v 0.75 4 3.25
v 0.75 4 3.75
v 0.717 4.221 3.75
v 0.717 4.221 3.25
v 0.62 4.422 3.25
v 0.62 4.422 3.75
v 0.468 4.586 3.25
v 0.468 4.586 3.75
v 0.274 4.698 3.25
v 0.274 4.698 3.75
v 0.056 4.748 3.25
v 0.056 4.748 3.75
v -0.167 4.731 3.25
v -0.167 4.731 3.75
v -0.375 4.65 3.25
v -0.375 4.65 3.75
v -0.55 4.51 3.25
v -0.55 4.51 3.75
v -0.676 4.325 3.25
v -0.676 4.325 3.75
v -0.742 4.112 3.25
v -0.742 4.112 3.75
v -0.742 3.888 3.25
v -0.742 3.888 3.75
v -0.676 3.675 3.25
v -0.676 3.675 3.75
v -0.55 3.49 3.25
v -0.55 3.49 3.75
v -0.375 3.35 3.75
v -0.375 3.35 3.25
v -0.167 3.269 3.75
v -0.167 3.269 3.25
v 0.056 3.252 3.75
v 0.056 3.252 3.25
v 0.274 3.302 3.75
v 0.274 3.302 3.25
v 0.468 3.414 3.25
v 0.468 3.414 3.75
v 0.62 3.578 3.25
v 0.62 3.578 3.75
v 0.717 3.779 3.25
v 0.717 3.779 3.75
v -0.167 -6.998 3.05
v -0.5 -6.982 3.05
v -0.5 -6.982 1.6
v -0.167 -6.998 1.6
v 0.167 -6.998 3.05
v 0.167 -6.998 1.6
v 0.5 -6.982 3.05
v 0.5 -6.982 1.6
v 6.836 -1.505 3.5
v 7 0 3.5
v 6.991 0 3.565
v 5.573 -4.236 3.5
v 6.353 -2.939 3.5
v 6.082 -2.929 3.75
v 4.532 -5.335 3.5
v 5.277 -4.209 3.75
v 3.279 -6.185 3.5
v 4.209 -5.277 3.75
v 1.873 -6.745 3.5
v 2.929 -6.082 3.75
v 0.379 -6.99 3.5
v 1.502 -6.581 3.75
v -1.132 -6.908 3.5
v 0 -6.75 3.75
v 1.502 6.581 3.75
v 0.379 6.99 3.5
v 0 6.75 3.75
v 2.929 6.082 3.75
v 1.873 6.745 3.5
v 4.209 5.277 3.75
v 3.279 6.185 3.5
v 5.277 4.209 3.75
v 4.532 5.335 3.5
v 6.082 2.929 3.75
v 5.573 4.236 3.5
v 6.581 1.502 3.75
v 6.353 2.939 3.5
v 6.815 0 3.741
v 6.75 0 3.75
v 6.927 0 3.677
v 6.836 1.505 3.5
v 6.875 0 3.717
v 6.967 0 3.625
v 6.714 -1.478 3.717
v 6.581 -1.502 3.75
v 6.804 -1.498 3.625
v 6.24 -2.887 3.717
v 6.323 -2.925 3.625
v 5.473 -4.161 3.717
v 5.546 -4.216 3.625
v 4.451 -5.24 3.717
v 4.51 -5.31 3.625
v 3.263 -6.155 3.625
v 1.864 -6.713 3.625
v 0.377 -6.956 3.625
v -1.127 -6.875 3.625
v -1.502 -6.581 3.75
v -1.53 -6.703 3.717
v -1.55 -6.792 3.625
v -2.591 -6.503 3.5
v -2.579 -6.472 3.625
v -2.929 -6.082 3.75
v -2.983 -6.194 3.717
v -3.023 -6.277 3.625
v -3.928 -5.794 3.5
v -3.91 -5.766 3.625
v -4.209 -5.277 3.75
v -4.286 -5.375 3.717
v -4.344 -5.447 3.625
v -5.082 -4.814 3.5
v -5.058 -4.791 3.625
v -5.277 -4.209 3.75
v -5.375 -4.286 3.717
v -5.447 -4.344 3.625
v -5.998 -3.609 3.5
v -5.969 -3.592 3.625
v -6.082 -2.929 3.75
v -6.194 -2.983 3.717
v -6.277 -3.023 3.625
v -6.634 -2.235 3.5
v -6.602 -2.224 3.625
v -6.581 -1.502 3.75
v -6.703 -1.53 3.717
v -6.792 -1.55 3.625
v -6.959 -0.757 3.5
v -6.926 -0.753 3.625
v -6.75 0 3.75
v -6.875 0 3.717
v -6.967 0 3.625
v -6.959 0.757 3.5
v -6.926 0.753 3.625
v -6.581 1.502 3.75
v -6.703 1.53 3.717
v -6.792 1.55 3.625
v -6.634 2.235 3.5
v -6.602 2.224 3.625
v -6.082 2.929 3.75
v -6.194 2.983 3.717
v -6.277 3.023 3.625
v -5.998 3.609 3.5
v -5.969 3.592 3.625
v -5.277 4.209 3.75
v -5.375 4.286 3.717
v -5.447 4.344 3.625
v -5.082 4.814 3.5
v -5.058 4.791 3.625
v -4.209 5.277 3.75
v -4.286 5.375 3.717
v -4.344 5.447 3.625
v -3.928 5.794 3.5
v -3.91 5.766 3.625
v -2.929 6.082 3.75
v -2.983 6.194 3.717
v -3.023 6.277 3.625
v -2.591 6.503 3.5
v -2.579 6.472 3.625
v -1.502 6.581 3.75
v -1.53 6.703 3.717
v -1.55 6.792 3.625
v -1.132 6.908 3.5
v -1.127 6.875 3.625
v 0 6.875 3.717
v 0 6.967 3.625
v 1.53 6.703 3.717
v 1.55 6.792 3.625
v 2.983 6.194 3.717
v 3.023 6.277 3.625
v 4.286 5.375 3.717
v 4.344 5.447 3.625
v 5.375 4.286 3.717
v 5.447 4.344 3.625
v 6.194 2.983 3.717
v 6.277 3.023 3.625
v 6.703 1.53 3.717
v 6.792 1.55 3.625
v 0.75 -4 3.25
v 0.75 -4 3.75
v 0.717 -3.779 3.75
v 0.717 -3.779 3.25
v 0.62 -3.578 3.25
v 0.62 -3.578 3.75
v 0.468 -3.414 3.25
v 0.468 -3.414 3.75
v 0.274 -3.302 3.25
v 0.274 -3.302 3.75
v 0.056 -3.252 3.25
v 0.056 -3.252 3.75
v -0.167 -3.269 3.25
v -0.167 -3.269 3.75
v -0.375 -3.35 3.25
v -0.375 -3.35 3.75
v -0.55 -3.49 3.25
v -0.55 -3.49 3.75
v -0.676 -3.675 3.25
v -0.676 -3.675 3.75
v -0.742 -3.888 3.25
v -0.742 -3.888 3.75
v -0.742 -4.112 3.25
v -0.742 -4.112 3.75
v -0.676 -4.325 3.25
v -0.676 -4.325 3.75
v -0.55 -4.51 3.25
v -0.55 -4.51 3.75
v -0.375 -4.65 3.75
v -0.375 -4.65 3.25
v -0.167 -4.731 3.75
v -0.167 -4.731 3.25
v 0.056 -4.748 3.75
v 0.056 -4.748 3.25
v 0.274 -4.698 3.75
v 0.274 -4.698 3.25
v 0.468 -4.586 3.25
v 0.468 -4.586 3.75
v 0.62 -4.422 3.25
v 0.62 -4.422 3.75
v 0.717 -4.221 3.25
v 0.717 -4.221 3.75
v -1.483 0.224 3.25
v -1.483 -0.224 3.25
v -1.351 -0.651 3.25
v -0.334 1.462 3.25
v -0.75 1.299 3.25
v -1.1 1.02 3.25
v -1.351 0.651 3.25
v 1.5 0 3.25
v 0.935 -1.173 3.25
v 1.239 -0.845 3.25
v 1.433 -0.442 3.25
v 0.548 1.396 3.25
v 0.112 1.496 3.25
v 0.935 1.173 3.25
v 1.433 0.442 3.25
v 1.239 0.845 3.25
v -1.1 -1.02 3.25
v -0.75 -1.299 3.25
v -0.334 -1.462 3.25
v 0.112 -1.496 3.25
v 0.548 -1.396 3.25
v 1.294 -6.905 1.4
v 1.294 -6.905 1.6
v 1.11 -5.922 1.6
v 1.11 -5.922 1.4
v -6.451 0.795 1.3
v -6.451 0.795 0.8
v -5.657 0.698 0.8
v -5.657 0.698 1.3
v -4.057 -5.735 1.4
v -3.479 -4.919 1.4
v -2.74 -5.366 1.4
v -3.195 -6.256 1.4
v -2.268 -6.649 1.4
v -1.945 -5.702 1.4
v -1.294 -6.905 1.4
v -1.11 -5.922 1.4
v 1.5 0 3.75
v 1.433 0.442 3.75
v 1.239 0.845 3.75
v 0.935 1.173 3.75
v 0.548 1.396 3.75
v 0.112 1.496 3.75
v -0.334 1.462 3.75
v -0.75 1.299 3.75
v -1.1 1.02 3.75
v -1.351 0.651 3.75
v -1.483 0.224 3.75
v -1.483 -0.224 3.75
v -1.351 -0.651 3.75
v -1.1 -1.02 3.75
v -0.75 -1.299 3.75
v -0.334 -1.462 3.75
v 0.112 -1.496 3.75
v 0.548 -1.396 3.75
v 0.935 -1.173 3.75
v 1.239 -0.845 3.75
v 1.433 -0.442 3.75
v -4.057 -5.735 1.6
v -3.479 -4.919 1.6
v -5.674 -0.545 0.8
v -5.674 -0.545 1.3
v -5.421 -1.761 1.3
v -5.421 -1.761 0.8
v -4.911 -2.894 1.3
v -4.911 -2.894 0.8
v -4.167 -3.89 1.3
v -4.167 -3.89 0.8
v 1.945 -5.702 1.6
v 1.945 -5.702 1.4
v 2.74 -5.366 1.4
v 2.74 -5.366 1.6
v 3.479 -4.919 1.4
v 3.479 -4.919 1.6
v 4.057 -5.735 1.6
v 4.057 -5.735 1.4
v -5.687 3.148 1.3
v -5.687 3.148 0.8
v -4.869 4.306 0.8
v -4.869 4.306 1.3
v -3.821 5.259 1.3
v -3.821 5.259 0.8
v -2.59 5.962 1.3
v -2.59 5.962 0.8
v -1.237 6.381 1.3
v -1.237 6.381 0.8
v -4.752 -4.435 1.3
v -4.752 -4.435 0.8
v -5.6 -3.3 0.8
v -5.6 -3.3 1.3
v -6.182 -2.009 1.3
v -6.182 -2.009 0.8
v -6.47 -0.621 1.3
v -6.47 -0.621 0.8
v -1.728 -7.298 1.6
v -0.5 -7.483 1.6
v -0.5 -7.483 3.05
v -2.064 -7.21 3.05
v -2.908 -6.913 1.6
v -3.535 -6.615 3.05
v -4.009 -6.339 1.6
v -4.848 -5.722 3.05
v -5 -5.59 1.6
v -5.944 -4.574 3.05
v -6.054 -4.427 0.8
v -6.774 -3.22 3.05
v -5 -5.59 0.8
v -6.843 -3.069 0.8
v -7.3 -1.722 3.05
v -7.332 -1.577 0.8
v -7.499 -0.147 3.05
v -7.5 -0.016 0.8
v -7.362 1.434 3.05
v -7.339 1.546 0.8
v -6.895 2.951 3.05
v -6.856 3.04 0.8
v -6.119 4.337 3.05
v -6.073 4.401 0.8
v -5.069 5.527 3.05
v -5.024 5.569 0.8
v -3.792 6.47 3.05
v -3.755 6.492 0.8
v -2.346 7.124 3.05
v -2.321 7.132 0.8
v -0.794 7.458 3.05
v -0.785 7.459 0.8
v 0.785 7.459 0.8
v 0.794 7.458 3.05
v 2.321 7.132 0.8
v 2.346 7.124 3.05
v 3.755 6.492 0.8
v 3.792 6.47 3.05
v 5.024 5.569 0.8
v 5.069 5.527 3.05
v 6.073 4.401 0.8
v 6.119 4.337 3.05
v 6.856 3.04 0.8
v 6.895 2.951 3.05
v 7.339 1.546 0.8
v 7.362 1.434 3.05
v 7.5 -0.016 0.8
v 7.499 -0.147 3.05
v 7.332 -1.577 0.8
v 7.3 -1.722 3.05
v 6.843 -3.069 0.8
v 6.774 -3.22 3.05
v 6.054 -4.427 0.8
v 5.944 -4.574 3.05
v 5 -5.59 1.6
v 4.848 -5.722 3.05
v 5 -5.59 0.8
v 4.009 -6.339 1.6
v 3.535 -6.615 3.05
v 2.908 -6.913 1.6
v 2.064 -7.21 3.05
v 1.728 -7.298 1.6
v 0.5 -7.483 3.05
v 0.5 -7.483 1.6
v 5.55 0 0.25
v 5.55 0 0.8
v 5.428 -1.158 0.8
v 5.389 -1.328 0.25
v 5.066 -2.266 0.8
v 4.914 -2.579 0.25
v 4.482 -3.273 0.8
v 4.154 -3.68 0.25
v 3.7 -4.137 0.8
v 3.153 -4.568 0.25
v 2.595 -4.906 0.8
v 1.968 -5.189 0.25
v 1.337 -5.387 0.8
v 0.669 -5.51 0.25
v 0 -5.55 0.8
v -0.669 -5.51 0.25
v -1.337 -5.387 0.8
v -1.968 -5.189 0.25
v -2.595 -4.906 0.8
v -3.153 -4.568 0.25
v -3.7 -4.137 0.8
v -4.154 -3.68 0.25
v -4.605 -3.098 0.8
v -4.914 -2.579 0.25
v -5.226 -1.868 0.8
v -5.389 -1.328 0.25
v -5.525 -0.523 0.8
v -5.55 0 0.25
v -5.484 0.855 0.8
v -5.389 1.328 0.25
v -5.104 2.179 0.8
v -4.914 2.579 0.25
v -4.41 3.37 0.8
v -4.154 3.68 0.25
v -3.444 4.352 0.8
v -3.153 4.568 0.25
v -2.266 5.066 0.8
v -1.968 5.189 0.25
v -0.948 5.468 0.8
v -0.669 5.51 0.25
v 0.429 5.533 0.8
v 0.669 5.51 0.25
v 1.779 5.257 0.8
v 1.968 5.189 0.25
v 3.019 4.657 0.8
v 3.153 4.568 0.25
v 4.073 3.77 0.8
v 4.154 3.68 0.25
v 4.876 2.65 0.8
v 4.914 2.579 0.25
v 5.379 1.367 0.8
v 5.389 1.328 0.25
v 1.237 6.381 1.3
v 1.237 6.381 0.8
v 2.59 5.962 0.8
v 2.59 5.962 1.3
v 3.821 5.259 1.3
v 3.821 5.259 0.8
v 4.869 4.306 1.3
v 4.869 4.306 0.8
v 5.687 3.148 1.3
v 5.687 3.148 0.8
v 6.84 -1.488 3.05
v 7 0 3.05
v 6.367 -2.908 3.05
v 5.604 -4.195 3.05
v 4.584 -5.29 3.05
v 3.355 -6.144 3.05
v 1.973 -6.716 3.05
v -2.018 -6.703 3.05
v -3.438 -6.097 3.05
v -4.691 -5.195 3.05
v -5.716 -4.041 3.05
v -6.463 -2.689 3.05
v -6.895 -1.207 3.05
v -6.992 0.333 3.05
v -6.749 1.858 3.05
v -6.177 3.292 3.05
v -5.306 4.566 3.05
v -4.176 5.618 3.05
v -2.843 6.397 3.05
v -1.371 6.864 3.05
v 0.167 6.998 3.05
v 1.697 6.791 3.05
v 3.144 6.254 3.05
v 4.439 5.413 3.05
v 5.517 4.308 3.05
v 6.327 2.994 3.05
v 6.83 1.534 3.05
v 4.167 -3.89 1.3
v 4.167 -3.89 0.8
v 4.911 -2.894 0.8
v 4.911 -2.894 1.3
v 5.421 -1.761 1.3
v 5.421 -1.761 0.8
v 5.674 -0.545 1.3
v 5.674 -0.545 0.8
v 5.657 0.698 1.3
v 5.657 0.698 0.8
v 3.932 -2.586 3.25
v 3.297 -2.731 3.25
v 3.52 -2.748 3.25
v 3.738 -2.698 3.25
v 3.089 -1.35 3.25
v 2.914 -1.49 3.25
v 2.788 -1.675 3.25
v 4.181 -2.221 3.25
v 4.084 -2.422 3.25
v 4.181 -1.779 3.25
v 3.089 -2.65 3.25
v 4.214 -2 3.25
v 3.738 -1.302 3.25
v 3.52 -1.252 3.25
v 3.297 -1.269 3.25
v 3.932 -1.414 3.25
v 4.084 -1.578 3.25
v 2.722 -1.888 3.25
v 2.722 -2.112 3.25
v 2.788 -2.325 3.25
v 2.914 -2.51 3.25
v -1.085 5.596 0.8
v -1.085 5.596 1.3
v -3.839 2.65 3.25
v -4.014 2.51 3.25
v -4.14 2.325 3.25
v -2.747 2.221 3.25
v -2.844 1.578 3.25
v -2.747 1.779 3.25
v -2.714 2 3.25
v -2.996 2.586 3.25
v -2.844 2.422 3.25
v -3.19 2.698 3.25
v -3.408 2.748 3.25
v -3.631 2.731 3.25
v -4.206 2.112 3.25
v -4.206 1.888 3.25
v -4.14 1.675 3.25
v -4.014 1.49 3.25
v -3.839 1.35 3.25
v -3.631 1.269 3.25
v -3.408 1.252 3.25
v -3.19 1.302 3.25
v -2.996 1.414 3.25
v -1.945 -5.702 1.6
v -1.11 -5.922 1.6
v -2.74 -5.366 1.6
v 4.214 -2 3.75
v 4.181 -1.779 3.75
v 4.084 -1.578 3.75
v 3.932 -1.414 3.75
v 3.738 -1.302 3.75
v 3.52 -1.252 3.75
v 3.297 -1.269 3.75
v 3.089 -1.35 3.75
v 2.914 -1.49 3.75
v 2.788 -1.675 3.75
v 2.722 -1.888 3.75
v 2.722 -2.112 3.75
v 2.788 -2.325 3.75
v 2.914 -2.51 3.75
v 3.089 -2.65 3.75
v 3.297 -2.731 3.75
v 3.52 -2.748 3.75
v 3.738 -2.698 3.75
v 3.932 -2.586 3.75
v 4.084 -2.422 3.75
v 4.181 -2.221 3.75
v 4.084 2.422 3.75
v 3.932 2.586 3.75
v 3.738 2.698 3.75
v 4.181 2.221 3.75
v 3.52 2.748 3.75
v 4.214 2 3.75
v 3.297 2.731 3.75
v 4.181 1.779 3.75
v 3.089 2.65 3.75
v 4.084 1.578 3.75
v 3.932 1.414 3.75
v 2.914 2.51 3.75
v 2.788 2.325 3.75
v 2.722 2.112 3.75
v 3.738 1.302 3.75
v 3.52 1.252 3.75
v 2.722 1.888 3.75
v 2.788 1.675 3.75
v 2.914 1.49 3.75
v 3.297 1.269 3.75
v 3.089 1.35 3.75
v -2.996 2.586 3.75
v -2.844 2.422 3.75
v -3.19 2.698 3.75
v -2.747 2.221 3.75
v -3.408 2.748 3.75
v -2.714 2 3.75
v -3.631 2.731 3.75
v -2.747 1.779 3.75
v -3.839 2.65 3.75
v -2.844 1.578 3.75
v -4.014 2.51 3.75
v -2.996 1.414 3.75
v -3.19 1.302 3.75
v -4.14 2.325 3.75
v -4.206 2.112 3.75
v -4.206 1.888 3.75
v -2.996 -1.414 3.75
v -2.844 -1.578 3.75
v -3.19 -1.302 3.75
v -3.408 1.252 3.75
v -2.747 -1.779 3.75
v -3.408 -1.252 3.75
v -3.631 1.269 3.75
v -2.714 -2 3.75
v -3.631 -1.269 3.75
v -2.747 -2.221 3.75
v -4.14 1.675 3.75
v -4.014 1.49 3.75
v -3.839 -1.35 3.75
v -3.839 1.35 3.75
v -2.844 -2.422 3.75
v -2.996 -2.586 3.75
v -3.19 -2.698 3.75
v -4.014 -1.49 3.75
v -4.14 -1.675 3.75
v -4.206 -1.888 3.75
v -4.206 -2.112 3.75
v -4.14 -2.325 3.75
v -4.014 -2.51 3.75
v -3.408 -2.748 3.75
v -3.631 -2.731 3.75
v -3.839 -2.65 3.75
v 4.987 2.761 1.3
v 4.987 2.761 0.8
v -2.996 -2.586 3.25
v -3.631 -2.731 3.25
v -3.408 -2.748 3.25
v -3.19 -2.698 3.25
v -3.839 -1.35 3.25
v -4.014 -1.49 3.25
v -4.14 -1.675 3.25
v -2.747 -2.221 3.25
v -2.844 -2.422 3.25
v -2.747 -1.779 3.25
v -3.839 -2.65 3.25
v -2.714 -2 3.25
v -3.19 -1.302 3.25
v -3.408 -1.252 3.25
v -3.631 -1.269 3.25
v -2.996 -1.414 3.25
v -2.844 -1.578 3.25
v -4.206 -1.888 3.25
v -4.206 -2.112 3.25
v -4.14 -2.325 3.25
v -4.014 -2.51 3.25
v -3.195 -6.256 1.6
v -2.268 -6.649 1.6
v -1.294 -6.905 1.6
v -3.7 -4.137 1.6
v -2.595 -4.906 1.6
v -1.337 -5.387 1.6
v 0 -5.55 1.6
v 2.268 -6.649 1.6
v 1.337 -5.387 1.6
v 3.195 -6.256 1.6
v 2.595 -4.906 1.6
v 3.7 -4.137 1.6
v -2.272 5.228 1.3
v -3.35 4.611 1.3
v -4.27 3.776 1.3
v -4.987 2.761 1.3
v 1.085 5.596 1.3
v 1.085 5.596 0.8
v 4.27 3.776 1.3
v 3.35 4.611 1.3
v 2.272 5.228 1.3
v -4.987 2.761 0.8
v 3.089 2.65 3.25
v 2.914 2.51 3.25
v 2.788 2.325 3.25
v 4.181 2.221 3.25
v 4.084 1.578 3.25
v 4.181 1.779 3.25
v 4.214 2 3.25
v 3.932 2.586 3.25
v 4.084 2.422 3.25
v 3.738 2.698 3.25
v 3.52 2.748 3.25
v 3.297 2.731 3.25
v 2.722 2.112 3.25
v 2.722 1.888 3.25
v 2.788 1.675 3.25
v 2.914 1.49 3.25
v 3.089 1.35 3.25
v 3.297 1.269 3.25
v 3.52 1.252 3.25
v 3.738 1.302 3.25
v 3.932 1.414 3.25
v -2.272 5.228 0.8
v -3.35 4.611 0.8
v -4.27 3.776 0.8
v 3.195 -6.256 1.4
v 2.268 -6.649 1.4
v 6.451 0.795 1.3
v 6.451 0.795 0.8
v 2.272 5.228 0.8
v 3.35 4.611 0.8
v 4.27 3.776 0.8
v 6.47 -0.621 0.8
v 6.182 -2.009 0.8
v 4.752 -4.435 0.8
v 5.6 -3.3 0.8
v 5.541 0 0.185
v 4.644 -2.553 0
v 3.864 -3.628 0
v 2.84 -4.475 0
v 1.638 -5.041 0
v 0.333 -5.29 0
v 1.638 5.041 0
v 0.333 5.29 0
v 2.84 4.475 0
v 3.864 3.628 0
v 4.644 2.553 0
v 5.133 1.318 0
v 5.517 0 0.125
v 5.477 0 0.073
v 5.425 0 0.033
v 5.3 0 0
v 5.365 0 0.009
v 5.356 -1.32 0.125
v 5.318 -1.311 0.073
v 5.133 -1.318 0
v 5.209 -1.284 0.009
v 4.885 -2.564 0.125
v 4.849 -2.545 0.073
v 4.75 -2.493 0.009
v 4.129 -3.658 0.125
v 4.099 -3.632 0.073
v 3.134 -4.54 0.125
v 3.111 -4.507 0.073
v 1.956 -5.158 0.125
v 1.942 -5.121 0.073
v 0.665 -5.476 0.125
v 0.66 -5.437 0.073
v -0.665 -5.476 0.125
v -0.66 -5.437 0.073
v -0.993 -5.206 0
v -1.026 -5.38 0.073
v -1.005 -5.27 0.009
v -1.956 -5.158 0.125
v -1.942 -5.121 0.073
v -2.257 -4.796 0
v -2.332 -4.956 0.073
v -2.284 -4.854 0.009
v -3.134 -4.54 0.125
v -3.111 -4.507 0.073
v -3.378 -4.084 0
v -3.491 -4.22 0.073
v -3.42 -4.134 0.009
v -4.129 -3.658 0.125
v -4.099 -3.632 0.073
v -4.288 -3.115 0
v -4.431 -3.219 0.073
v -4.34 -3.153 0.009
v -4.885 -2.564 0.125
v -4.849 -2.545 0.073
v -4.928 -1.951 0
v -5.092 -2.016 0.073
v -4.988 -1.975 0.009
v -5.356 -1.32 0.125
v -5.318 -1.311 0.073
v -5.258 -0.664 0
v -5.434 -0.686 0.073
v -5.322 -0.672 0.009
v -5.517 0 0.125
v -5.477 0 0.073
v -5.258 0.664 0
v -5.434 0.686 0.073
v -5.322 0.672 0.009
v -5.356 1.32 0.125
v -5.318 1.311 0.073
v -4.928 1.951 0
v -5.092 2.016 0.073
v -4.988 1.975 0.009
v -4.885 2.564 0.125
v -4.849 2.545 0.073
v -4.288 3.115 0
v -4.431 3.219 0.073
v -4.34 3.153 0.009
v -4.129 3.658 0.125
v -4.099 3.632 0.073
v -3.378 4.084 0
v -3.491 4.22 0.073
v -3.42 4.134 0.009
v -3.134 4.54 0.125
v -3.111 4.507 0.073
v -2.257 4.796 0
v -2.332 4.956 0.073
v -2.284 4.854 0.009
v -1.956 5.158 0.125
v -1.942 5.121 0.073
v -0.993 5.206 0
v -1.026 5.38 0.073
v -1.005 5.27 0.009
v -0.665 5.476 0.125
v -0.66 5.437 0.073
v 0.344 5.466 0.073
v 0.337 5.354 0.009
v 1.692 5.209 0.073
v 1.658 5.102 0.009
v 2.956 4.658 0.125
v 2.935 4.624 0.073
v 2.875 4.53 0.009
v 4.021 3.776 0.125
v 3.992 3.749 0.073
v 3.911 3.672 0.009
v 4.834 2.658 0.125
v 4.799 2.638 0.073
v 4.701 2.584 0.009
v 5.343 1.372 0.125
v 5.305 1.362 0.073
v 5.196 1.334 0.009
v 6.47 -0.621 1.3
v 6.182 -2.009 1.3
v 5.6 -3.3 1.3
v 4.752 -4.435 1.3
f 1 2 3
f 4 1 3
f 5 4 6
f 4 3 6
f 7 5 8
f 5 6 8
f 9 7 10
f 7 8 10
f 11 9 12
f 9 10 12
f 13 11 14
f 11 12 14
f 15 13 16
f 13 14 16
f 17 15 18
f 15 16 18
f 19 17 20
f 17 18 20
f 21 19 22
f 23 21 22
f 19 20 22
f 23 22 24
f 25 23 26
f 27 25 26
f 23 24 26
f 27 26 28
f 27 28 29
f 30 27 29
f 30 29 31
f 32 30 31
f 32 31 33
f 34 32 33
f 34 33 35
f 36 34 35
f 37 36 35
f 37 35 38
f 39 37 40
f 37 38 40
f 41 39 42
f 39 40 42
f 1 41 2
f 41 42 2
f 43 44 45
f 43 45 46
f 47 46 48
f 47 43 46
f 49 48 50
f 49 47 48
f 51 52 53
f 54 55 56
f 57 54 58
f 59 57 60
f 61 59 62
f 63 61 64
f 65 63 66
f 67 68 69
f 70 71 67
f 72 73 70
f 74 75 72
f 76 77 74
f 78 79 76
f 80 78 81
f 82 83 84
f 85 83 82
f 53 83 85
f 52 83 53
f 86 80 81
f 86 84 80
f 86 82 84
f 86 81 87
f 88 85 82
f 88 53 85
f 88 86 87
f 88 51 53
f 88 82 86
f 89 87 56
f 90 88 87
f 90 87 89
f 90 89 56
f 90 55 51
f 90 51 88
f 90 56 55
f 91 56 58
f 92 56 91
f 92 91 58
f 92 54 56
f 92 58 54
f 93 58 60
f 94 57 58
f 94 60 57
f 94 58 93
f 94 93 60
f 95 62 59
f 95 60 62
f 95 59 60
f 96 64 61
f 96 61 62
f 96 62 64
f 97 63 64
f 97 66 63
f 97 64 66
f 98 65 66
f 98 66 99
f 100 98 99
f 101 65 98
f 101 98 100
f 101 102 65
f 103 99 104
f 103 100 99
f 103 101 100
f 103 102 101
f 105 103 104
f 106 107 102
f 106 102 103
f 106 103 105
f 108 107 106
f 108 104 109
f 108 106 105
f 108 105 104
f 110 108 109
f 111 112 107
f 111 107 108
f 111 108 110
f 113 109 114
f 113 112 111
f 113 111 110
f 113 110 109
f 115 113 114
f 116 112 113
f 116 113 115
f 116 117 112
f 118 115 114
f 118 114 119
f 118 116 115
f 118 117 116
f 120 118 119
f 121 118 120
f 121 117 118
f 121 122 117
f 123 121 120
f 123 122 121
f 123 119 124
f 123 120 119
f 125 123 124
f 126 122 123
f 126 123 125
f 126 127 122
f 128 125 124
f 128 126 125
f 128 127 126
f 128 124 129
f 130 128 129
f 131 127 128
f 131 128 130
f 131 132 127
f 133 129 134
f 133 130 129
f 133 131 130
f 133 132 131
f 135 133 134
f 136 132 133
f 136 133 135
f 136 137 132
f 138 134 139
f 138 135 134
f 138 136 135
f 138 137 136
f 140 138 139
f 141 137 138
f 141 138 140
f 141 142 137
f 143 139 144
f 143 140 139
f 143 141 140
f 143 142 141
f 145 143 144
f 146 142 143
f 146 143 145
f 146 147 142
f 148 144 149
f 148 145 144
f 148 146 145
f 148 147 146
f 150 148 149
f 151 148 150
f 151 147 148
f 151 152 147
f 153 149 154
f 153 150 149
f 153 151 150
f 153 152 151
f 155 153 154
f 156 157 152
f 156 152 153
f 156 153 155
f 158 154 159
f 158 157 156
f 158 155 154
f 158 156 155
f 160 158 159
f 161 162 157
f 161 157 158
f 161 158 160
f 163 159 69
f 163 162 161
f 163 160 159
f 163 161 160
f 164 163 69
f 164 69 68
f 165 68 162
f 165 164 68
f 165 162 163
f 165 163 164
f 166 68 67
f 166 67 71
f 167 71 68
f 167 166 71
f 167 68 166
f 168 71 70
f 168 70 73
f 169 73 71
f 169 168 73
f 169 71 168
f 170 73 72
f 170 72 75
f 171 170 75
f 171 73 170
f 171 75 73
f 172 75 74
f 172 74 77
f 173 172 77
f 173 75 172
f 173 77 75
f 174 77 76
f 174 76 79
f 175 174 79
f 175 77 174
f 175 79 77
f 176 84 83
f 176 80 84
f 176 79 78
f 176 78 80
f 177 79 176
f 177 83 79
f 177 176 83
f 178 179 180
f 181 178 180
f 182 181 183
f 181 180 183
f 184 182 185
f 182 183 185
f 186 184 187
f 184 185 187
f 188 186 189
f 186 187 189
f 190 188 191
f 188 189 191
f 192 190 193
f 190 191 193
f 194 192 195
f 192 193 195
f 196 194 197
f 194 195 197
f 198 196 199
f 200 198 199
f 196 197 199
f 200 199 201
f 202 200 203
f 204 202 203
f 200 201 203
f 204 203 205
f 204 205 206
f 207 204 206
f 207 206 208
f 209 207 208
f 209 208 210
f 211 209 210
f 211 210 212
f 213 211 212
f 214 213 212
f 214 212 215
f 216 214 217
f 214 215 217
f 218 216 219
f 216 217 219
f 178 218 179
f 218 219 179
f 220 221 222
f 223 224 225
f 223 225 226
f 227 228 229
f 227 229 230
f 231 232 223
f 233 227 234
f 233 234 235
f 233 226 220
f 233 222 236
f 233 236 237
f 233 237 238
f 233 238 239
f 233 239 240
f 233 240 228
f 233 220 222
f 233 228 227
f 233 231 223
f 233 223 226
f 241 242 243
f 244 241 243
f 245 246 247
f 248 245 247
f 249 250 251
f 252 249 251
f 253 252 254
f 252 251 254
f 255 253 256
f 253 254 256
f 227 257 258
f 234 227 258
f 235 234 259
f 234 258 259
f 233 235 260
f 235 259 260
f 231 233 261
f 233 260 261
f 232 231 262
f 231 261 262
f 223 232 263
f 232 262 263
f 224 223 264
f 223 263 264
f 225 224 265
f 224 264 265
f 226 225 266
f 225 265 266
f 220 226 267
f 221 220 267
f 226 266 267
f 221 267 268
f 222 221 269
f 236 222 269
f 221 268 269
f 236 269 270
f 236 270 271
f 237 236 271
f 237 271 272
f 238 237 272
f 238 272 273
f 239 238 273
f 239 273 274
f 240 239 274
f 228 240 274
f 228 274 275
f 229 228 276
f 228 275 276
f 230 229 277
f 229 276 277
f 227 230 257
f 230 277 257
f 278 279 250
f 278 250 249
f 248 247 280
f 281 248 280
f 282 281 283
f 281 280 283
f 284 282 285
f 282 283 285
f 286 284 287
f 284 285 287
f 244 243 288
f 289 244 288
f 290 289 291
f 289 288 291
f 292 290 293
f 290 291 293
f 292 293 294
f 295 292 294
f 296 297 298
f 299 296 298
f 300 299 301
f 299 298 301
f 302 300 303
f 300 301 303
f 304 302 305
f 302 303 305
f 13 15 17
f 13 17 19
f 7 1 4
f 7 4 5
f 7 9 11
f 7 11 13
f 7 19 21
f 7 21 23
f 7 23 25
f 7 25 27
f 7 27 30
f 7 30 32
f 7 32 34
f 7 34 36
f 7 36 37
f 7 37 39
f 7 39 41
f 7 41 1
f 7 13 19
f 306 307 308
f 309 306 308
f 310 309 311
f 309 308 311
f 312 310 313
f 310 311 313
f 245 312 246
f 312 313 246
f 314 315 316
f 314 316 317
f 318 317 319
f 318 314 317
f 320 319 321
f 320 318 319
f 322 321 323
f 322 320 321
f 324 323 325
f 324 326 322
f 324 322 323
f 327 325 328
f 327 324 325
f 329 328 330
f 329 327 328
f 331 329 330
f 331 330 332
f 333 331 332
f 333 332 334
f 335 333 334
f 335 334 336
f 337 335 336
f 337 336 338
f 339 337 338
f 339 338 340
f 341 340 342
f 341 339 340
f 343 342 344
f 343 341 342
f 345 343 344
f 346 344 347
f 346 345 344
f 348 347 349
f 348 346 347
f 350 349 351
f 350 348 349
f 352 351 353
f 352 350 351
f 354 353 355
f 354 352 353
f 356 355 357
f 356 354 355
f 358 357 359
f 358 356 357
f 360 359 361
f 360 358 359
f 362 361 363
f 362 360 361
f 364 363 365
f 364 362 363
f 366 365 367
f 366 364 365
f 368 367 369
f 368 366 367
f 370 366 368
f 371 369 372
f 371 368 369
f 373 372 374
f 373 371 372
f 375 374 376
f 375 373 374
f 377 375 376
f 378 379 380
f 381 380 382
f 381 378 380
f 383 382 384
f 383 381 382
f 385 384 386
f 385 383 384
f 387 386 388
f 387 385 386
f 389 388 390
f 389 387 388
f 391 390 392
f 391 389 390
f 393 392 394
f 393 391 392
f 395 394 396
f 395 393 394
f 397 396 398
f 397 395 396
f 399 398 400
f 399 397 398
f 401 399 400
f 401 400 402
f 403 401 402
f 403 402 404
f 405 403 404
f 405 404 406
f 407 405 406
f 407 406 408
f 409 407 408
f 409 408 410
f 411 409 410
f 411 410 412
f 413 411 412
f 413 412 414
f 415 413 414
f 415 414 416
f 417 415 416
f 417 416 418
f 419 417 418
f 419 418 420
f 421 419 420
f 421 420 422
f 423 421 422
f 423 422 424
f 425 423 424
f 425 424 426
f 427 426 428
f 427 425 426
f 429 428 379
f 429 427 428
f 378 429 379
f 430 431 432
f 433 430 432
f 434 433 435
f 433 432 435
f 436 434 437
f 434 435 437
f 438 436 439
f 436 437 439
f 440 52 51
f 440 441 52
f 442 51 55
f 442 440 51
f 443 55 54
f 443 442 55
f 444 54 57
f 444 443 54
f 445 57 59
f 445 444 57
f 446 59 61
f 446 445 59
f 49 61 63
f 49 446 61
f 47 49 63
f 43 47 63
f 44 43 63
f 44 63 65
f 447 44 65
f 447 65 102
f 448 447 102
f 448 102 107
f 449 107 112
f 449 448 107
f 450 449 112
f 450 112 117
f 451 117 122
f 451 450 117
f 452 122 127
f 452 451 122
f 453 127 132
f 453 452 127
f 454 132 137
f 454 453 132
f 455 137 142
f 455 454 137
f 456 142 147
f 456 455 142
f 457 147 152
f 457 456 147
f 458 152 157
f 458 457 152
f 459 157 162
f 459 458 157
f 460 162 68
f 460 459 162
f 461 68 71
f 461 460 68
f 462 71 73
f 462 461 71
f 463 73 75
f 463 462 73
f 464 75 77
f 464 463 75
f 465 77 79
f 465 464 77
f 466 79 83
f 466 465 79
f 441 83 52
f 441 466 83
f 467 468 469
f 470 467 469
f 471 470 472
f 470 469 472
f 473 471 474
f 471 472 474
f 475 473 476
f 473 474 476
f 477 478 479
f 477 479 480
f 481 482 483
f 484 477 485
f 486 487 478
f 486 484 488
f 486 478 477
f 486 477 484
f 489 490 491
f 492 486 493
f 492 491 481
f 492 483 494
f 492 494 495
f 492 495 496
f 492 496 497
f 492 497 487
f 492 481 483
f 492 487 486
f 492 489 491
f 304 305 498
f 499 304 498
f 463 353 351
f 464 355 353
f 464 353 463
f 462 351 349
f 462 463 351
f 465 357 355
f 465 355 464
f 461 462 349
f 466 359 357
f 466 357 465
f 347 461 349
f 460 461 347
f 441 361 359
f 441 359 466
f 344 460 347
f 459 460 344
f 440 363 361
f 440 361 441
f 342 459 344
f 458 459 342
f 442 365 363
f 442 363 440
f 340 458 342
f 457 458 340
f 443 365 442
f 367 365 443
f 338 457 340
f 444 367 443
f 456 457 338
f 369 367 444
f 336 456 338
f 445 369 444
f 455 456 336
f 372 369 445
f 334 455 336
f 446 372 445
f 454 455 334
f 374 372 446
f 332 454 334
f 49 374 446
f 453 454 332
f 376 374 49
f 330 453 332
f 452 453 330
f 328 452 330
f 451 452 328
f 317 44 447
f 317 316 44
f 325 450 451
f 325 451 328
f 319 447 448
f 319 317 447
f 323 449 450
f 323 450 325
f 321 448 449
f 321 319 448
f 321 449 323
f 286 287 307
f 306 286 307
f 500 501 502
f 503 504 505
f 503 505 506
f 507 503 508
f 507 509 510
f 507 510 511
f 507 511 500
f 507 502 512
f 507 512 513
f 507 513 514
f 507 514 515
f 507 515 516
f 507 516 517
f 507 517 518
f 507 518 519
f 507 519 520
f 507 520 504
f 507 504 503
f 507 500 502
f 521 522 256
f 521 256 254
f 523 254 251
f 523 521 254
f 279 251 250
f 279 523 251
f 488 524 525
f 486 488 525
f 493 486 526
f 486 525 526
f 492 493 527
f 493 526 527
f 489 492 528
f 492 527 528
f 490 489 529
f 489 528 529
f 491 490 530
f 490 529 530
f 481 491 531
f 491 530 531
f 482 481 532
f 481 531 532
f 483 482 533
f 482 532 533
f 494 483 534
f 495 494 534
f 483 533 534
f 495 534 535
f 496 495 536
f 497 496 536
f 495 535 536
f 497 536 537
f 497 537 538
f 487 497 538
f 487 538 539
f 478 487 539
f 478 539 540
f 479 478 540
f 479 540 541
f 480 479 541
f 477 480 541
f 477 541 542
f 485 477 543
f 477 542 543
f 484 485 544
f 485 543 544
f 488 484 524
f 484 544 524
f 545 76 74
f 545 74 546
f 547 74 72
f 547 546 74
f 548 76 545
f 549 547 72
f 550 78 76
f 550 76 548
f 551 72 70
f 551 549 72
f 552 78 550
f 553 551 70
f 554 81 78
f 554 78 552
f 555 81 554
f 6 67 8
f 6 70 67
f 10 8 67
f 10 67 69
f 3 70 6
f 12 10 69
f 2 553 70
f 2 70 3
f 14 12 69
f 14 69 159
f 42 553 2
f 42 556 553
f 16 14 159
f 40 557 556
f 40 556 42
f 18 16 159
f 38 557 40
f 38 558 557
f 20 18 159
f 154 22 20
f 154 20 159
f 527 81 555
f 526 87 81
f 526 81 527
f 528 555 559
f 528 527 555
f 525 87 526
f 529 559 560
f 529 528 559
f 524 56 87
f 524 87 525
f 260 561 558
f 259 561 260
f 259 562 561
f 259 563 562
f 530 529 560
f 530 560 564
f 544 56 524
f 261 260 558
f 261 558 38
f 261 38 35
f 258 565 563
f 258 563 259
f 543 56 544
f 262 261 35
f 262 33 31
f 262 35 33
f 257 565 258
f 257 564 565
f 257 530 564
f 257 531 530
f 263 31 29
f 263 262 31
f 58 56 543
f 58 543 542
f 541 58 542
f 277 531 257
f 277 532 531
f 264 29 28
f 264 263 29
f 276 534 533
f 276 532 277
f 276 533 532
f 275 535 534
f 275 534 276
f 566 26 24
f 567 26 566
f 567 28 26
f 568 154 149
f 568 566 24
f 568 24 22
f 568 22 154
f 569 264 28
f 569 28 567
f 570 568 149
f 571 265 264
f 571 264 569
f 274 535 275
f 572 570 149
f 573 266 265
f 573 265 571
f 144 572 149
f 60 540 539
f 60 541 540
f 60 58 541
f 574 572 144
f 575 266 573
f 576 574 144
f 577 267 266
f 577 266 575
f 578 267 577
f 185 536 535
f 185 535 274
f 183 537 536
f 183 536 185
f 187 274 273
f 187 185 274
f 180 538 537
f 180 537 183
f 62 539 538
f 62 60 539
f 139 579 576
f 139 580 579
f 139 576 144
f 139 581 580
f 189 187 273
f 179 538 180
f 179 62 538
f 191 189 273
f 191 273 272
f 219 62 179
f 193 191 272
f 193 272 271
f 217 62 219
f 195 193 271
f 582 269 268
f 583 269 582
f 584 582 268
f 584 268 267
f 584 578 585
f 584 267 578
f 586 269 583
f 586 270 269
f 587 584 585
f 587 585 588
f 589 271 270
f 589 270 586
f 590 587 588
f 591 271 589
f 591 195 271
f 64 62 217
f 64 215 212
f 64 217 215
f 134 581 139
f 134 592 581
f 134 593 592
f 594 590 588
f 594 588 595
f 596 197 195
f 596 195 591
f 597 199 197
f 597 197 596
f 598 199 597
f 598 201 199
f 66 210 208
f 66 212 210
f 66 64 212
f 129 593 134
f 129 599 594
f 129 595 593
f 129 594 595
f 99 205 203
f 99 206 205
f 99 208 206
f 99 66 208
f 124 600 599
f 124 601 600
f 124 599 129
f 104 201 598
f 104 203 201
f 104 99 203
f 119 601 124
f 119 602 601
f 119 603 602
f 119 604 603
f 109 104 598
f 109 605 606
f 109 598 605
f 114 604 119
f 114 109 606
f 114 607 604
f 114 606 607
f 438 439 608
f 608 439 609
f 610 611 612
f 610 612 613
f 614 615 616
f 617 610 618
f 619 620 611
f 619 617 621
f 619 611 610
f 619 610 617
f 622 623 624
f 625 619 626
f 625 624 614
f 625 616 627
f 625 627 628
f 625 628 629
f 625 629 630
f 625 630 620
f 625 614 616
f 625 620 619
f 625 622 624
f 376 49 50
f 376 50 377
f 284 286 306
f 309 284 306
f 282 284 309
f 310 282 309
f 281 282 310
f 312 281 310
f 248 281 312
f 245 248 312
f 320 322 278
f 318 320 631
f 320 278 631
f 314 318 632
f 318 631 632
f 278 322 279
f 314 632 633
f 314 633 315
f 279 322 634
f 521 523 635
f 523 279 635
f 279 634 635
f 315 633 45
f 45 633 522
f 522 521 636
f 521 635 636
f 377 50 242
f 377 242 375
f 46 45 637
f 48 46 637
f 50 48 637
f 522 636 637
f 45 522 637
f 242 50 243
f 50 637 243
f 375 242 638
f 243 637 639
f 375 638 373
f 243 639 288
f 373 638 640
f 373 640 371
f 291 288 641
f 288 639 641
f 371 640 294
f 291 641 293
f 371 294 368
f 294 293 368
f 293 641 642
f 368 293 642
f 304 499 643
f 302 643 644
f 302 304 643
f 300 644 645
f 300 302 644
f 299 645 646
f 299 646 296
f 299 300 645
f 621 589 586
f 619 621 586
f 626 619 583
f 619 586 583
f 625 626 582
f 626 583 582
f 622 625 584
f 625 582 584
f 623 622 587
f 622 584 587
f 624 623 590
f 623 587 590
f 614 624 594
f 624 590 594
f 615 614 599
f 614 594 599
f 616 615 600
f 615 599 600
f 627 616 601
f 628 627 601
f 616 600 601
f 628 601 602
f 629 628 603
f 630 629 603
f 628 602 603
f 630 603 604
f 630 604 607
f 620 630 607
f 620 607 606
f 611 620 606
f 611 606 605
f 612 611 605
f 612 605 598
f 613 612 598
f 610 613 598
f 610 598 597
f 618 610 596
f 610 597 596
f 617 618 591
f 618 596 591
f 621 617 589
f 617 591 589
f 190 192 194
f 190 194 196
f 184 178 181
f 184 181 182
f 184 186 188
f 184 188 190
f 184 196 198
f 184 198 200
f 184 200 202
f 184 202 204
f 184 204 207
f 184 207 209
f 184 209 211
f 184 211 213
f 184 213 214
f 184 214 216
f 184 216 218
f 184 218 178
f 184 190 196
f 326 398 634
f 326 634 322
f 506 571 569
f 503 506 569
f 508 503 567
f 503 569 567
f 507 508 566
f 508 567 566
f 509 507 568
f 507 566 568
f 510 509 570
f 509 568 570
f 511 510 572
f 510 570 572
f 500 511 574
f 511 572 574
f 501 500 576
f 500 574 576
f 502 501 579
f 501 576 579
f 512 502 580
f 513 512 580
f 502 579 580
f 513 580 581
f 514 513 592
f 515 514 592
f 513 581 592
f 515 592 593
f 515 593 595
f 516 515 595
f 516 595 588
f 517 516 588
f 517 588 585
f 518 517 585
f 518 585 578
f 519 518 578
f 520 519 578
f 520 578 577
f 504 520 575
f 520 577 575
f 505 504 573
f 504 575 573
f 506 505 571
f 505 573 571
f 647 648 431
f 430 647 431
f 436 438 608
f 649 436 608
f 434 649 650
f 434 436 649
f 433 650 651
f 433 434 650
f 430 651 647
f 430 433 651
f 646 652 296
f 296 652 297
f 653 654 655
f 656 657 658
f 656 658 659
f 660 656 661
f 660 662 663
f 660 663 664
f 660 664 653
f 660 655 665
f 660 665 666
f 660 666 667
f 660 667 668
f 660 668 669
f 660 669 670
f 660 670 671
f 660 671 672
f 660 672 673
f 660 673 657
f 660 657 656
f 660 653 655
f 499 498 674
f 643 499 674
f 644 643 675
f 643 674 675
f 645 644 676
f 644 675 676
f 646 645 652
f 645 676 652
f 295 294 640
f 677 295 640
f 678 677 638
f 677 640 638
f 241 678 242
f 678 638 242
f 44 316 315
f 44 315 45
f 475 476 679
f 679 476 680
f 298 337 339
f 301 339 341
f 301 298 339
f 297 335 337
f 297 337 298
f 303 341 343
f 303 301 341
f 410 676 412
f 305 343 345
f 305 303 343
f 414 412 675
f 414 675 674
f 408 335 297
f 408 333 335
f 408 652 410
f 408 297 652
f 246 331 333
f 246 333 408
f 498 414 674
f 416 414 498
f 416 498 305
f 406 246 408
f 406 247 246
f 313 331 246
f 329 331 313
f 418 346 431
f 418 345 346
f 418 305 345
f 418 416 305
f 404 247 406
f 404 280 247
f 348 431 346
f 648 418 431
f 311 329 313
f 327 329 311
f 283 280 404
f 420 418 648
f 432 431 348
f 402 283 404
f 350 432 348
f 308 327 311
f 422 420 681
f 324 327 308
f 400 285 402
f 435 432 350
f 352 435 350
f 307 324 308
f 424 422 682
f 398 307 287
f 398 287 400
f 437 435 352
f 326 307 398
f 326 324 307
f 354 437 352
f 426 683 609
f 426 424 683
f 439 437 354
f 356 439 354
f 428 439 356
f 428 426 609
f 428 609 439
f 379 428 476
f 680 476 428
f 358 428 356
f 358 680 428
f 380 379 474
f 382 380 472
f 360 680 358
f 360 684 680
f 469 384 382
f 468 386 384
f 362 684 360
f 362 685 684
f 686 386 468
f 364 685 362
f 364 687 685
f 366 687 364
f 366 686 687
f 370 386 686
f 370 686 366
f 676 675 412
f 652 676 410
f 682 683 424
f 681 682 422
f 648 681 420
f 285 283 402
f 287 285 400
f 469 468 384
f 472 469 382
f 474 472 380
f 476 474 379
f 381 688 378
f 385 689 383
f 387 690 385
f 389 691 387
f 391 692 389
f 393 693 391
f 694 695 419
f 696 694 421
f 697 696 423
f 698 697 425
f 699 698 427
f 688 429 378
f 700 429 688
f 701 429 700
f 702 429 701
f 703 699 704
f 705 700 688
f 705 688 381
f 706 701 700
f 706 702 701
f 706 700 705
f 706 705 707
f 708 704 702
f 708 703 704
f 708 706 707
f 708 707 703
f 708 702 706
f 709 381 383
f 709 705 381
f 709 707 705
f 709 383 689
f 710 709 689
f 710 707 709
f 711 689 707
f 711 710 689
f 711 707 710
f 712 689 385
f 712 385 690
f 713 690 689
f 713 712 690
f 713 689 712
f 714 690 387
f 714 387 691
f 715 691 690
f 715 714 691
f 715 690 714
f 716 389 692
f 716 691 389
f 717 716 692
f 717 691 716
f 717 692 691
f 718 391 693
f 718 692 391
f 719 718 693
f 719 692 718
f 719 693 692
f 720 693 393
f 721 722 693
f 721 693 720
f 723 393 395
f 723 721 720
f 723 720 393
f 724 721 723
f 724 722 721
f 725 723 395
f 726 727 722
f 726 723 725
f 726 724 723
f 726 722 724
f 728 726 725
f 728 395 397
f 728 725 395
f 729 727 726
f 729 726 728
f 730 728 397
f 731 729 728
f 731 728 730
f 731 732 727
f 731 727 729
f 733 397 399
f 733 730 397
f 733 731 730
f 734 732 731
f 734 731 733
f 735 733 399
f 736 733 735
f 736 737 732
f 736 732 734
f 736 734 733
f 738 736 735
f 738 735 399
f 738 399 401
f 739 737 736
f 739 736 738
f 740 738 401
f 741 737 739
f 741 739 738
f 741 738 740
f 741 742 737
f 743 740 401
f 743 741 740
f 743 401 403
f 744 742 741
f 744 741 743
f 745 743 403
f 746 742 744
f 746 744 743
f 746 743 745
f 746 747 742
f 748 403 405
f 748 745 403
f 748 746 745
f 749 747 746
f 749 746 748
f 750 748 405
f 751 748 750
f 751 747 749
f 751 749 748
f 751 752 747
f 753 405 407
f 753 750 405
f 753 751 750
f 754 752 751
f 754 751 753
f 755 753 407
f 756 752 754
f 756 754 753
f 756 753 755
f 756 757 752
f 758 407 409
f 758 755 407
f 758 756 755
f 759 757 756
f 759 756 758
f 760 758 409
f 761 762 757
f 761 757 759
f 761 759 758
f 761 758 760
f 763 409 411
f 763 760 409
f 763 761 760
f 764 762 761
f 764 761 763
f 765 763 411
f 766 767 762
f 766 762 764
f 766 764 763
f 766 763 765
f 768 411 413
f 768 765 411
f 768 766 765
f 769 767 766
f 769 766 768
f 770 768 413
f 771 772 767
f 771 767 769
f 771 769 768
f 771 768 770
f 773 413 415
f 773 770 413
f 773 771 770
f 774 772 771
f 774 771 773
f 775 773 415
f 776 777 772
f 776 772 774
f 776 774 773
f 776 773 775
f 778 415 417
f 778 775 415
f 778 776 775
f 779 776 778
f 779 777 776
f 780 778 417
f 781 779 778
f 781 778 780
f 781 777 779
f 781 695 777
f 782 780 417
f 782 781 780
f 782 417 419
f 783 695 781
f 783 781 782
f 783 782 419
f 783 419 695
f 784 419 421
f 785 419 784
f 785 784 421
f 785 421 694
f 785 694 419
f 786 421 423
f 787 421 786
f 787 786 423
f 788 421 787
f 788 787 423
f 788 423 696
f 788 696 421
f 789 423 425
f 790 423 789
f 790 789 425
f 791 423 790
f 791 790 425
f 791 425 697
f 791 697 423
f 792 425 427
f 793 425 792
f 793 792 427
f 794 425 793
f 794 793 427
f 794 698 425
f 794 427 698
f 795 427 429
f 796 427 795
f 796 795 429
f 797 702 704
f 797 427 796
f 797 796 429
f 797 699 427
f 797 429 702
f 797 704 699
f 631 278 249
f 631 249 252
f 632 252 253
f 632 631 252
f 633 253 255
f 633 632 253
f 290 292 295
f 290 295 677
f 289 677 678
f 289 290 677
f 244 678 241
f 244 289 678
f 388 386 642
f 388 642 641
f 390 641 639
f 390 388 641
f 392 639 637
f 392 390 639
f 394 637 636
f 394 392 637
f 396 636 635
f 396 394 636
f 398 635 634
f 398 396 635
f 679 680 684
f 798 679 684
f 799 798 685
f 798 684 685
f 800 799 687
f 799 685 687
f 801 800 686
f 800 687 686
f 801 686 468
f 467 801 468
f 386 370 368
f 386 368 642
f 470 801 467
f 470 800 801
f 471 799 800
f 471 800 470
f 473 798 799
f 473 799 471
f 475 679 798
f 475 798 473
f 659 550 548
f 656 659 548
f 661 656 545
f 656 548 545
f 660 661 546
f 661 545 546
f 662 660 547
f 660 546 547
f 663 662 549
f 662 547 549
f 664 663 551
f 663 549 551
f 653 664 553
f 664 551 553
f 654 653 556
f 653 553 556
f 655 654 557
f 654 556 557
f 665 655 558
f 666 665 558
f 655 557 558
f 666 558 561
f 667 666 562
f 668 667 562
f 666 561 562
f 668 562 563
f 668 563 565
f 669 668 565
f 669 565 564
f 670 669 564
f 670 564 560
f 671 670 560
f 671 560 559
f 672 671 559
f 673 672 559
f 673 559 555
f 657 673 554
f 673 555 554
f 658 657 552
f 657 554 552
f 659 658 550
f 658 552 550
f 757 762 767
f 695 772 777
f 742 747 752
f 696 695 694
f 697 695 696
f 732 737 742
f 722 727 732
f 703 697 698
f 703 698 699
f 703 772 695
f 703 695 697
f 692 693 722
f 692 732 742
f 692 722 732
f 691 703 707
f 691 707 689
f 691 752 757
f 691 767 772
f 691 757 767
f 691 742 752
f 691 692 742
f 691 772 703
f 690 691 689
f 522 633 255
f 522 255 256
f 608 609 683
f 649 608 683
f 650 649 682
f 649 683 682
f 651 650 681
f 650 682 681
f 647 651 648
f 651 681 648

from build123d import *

# Parameters (mm, degrees)
FILLET_1_R          = 0.25
SKETCH_2_R          = 1.5
SKETCH_2_R_2        = 0.75
CUT_EXTRUDE_1_DEPTH = 0.5
CUT_EXTRUDE_2_REACH = 13.036
CUT_EXTRUDE_3_DEPTH = 0.5
CUT_EXTRUDE_4_DEPTH = 0.8
EXTRUDE_1_DEPTH     = 0.2


with BuildPart() as part:
    # Эскиз1 → Повернуть1 (revolve)
    with BuildSketch(Plane(origin=(0, 0, 0), x_dir=(1, 0, 0), z_dir=(0, 1, 0)), mode=Mode.PRIVATE) as revolve_1_sk:
        Polygon((0, 0), (0, -3.75), (-7, -3.75), (-7, -3.05), (-7.5, -3.05), (-7.5, -0.8), (-5.55, -0.8), (-5.55, 0), align=None)
    revolve(revolve_1_sk.sketch.rotate(Axis((0, 0, 0), (0, 0, -1)), 180), axis=Axis((0, 0, 0), (0, 0, -1)))

    # Скругление1
    fillet_1_edges = [part.edges().sort_by_distance(p)[0] for p in [
        (-5.55, 0, 0),
        (-7, 0, 3.75),
    ]]
    fillet(fillet_1_edges, radius=FILLET_1_R)

    # Эскиз2 → Вырез-Вытянуть1 (cut)
    with BuildSketch(Plane.XY.offset(3.75)):
        Circle(SKETCH_2_R)
        with Locations((0, -4)):
            Circle(SKETCH_2_R_2)
        with Locations((-3.464101615, -2)):
            Circle(SKETCH_2_R_2)
        with Locations((-3.464101615, 2)):
            Circle(SKETCH_2_R_2)
        with Locations((0, 4)):
            Circle(SKETCH_2_R_2)
        with Locations((3.464101615, 2)):
            Circle(SKETCH_2_R_2)
        with Locations((3.464101615, -2)):
            Circle(SKETCH_2_R_2)
    extrude(amount=-CUT_EXTRUDE_1_DEPTH, mode=Mode.SUBTRACT)

    # Эскиз3 → Вырез-Вытянуть2 (cut, up to next)
    with BuildSketch(Plane.XY.offset(3.05), mode=Mode.PRIVATE) as cut_extrude_2_sk1:
        with BuildLine():
            Line((0.5, -6.982120022), (0.5, -7.483314774))
            ThreePointArc((0.5, -7.483314774), (0, -7.5), (-0.5, -7.483314774))
            Line((-0.5, -7.483314774), (-0.5, -6.982120022))
            ThreePointArc((-0.5, -6.982120022), (0, -7), (0.5, -6.982120022))
        make_face()
    cut_extrude_2_tool1 = extrude(cut_extrude_2_sk1.sketch, amount=-CUT_EXTRUDE_2_REACH, mode=Mode.PRIVATE) & part.part
    add(cut_extrude_2_tool1.solids().sort_by_distance((0, -7.244238, 3.05))[0], mode=Mode.SUBTRACT)

    # Эскиз4 → Вырез-Вытянуть3 (cut)
    with BuildSketch(Plane(origin=(0, 0, 0.8), x_dir=(-1, 0, 0), z_dir=(0, 0, -1))):
        with BuildLine():
            Line((-4.751554754, -4.435394844), (-4.166748015, -3.889500094))
            ThreePointArc((-4.166748015, -3.889500094), (-5.421022143, -1.761396868), (-5.657160749, 0.697518642))
            Line((-5.657160749, 0.697518642), (-6.451148223, 0.795415996))
            ThreePointArc((-6.451148223, 0.795415996), (-6.181867356, -2.008610463), (-4.751554754, -4.435394844))
        make_face()
        with BuildLine():
            Line((-5.686622337, 3.148384728), (-4.986730357, 2.760891223))
            ThreePointArc((-4.986730357, 2.760891223), (-3.350375938, 4.611396868), (-1.084779161, 5.595824709))
            Line((-1.084779161, 5.595824709), (-1.237028868, 6.381203615))
            ThreePointArc((-1.237028868, 6.381203615), (-3.82060414, 5.258610463), (-5.686622337, 3.148384728))
        make_face()
        with BuildLine():
            Line((1.237028868, 6.381203615), (1.084779161, 5.595824709))
            ThreePointArc((1.084779161, 5.595824709), (3.350375938, 4.611396868), (4.986730357, 2.760891223))
            Line((4.986730357, 2.760891223), (5.686622337, 3.148384728))
            ThreePointArc((5.686622337, 3.148384728), (3.82060414, 5.258610463), (1.237028868, 6.381203615))
        make_face()
        with BuildLine():
            Line((6.451148223, 0.795415996), (5.657160749, 0.697518642))
            ThreePointArc((5.657160749, 0.697518642), (5.421022143, -1.761396868), (4.166748015, -3.889500094))
            Line((4.166748015, -3.889500094), (4.751554754, -4.435394844))
            ThreePointArc((4.751554754, -4.435394844), (6.181867356, -2.008610463), (6.451148223, 0.795415996))
        make_face()
    extrude(amount=-CUT_EXTRUDE_3_DEPTH, mode=Mode.SUBTRACT)

    # Эскиз5 → Вырез-Вытянуть4 (cut)
    with BuildSketch(Plane(origin=(0, 0, 0.8), x_dir=(-1, 0, 0), z_dir=(0, 0, -1))):
        with BuildLine():
            Line((-5, -5.590169944), (-3.7, -4.136725758))
            ThreePointArc((-3.7, -4.136725758), (0, -5.55), (3.7, -4.136725758))
            Line((3.7, -4.136725758), (5, -5.590169944))
            ThreePointArc((5, -5.590169944), (0, -7.5), (-5, -5.590169944))
        make_face()
    extrude(amount=-CUT_EXTRUDE_4_DEPTH, mode=Mode.SUBTRACT)

    # Эскиз6 → Бобышка-Вытянуть1 (add)
    with BuildSketch(Plane(origin=(0, 0, 1.6), x_dir=(-1, 0, 0), z_dir=(0, 0, -1))):
        with BuildLine():
            Line((-1.294304744, -6.904737521), (-1.110062076, -5.921856735))
            ThreePointArc((-1.110062076, -5.921856735), (-2.348915229, -5.548262994), (-3.479427056, -4.918761263))
            Line((-3.479427056, -4.918761263), (-4.056925322, -5.735153174))
            ThreePointArc((-4.056925322, -5.735153174), (-2.738776678, -6.46913652), (-1.294304744, -6.904737521))
        make_face()
        with BuildLine():
            Line((3.479427056, -4.918761263), (4.056925322, -5.735153174))
            ThreePointArc((4.056925322, -5.735153174), (2.738776678, -6.46913652), (1.294304744, -6.904737521))
            Line((1.294304744, -6.904737521), (1.110062076, -5.921856735))
            ThreePointArc((1.110062076, -5.921856735), (2.348915229, -5.548262994), (3.479427056, -4.918761263))
        make_face()
    extrude(amount=EXTRUDE_1_DEPTH)


solid = part.part
